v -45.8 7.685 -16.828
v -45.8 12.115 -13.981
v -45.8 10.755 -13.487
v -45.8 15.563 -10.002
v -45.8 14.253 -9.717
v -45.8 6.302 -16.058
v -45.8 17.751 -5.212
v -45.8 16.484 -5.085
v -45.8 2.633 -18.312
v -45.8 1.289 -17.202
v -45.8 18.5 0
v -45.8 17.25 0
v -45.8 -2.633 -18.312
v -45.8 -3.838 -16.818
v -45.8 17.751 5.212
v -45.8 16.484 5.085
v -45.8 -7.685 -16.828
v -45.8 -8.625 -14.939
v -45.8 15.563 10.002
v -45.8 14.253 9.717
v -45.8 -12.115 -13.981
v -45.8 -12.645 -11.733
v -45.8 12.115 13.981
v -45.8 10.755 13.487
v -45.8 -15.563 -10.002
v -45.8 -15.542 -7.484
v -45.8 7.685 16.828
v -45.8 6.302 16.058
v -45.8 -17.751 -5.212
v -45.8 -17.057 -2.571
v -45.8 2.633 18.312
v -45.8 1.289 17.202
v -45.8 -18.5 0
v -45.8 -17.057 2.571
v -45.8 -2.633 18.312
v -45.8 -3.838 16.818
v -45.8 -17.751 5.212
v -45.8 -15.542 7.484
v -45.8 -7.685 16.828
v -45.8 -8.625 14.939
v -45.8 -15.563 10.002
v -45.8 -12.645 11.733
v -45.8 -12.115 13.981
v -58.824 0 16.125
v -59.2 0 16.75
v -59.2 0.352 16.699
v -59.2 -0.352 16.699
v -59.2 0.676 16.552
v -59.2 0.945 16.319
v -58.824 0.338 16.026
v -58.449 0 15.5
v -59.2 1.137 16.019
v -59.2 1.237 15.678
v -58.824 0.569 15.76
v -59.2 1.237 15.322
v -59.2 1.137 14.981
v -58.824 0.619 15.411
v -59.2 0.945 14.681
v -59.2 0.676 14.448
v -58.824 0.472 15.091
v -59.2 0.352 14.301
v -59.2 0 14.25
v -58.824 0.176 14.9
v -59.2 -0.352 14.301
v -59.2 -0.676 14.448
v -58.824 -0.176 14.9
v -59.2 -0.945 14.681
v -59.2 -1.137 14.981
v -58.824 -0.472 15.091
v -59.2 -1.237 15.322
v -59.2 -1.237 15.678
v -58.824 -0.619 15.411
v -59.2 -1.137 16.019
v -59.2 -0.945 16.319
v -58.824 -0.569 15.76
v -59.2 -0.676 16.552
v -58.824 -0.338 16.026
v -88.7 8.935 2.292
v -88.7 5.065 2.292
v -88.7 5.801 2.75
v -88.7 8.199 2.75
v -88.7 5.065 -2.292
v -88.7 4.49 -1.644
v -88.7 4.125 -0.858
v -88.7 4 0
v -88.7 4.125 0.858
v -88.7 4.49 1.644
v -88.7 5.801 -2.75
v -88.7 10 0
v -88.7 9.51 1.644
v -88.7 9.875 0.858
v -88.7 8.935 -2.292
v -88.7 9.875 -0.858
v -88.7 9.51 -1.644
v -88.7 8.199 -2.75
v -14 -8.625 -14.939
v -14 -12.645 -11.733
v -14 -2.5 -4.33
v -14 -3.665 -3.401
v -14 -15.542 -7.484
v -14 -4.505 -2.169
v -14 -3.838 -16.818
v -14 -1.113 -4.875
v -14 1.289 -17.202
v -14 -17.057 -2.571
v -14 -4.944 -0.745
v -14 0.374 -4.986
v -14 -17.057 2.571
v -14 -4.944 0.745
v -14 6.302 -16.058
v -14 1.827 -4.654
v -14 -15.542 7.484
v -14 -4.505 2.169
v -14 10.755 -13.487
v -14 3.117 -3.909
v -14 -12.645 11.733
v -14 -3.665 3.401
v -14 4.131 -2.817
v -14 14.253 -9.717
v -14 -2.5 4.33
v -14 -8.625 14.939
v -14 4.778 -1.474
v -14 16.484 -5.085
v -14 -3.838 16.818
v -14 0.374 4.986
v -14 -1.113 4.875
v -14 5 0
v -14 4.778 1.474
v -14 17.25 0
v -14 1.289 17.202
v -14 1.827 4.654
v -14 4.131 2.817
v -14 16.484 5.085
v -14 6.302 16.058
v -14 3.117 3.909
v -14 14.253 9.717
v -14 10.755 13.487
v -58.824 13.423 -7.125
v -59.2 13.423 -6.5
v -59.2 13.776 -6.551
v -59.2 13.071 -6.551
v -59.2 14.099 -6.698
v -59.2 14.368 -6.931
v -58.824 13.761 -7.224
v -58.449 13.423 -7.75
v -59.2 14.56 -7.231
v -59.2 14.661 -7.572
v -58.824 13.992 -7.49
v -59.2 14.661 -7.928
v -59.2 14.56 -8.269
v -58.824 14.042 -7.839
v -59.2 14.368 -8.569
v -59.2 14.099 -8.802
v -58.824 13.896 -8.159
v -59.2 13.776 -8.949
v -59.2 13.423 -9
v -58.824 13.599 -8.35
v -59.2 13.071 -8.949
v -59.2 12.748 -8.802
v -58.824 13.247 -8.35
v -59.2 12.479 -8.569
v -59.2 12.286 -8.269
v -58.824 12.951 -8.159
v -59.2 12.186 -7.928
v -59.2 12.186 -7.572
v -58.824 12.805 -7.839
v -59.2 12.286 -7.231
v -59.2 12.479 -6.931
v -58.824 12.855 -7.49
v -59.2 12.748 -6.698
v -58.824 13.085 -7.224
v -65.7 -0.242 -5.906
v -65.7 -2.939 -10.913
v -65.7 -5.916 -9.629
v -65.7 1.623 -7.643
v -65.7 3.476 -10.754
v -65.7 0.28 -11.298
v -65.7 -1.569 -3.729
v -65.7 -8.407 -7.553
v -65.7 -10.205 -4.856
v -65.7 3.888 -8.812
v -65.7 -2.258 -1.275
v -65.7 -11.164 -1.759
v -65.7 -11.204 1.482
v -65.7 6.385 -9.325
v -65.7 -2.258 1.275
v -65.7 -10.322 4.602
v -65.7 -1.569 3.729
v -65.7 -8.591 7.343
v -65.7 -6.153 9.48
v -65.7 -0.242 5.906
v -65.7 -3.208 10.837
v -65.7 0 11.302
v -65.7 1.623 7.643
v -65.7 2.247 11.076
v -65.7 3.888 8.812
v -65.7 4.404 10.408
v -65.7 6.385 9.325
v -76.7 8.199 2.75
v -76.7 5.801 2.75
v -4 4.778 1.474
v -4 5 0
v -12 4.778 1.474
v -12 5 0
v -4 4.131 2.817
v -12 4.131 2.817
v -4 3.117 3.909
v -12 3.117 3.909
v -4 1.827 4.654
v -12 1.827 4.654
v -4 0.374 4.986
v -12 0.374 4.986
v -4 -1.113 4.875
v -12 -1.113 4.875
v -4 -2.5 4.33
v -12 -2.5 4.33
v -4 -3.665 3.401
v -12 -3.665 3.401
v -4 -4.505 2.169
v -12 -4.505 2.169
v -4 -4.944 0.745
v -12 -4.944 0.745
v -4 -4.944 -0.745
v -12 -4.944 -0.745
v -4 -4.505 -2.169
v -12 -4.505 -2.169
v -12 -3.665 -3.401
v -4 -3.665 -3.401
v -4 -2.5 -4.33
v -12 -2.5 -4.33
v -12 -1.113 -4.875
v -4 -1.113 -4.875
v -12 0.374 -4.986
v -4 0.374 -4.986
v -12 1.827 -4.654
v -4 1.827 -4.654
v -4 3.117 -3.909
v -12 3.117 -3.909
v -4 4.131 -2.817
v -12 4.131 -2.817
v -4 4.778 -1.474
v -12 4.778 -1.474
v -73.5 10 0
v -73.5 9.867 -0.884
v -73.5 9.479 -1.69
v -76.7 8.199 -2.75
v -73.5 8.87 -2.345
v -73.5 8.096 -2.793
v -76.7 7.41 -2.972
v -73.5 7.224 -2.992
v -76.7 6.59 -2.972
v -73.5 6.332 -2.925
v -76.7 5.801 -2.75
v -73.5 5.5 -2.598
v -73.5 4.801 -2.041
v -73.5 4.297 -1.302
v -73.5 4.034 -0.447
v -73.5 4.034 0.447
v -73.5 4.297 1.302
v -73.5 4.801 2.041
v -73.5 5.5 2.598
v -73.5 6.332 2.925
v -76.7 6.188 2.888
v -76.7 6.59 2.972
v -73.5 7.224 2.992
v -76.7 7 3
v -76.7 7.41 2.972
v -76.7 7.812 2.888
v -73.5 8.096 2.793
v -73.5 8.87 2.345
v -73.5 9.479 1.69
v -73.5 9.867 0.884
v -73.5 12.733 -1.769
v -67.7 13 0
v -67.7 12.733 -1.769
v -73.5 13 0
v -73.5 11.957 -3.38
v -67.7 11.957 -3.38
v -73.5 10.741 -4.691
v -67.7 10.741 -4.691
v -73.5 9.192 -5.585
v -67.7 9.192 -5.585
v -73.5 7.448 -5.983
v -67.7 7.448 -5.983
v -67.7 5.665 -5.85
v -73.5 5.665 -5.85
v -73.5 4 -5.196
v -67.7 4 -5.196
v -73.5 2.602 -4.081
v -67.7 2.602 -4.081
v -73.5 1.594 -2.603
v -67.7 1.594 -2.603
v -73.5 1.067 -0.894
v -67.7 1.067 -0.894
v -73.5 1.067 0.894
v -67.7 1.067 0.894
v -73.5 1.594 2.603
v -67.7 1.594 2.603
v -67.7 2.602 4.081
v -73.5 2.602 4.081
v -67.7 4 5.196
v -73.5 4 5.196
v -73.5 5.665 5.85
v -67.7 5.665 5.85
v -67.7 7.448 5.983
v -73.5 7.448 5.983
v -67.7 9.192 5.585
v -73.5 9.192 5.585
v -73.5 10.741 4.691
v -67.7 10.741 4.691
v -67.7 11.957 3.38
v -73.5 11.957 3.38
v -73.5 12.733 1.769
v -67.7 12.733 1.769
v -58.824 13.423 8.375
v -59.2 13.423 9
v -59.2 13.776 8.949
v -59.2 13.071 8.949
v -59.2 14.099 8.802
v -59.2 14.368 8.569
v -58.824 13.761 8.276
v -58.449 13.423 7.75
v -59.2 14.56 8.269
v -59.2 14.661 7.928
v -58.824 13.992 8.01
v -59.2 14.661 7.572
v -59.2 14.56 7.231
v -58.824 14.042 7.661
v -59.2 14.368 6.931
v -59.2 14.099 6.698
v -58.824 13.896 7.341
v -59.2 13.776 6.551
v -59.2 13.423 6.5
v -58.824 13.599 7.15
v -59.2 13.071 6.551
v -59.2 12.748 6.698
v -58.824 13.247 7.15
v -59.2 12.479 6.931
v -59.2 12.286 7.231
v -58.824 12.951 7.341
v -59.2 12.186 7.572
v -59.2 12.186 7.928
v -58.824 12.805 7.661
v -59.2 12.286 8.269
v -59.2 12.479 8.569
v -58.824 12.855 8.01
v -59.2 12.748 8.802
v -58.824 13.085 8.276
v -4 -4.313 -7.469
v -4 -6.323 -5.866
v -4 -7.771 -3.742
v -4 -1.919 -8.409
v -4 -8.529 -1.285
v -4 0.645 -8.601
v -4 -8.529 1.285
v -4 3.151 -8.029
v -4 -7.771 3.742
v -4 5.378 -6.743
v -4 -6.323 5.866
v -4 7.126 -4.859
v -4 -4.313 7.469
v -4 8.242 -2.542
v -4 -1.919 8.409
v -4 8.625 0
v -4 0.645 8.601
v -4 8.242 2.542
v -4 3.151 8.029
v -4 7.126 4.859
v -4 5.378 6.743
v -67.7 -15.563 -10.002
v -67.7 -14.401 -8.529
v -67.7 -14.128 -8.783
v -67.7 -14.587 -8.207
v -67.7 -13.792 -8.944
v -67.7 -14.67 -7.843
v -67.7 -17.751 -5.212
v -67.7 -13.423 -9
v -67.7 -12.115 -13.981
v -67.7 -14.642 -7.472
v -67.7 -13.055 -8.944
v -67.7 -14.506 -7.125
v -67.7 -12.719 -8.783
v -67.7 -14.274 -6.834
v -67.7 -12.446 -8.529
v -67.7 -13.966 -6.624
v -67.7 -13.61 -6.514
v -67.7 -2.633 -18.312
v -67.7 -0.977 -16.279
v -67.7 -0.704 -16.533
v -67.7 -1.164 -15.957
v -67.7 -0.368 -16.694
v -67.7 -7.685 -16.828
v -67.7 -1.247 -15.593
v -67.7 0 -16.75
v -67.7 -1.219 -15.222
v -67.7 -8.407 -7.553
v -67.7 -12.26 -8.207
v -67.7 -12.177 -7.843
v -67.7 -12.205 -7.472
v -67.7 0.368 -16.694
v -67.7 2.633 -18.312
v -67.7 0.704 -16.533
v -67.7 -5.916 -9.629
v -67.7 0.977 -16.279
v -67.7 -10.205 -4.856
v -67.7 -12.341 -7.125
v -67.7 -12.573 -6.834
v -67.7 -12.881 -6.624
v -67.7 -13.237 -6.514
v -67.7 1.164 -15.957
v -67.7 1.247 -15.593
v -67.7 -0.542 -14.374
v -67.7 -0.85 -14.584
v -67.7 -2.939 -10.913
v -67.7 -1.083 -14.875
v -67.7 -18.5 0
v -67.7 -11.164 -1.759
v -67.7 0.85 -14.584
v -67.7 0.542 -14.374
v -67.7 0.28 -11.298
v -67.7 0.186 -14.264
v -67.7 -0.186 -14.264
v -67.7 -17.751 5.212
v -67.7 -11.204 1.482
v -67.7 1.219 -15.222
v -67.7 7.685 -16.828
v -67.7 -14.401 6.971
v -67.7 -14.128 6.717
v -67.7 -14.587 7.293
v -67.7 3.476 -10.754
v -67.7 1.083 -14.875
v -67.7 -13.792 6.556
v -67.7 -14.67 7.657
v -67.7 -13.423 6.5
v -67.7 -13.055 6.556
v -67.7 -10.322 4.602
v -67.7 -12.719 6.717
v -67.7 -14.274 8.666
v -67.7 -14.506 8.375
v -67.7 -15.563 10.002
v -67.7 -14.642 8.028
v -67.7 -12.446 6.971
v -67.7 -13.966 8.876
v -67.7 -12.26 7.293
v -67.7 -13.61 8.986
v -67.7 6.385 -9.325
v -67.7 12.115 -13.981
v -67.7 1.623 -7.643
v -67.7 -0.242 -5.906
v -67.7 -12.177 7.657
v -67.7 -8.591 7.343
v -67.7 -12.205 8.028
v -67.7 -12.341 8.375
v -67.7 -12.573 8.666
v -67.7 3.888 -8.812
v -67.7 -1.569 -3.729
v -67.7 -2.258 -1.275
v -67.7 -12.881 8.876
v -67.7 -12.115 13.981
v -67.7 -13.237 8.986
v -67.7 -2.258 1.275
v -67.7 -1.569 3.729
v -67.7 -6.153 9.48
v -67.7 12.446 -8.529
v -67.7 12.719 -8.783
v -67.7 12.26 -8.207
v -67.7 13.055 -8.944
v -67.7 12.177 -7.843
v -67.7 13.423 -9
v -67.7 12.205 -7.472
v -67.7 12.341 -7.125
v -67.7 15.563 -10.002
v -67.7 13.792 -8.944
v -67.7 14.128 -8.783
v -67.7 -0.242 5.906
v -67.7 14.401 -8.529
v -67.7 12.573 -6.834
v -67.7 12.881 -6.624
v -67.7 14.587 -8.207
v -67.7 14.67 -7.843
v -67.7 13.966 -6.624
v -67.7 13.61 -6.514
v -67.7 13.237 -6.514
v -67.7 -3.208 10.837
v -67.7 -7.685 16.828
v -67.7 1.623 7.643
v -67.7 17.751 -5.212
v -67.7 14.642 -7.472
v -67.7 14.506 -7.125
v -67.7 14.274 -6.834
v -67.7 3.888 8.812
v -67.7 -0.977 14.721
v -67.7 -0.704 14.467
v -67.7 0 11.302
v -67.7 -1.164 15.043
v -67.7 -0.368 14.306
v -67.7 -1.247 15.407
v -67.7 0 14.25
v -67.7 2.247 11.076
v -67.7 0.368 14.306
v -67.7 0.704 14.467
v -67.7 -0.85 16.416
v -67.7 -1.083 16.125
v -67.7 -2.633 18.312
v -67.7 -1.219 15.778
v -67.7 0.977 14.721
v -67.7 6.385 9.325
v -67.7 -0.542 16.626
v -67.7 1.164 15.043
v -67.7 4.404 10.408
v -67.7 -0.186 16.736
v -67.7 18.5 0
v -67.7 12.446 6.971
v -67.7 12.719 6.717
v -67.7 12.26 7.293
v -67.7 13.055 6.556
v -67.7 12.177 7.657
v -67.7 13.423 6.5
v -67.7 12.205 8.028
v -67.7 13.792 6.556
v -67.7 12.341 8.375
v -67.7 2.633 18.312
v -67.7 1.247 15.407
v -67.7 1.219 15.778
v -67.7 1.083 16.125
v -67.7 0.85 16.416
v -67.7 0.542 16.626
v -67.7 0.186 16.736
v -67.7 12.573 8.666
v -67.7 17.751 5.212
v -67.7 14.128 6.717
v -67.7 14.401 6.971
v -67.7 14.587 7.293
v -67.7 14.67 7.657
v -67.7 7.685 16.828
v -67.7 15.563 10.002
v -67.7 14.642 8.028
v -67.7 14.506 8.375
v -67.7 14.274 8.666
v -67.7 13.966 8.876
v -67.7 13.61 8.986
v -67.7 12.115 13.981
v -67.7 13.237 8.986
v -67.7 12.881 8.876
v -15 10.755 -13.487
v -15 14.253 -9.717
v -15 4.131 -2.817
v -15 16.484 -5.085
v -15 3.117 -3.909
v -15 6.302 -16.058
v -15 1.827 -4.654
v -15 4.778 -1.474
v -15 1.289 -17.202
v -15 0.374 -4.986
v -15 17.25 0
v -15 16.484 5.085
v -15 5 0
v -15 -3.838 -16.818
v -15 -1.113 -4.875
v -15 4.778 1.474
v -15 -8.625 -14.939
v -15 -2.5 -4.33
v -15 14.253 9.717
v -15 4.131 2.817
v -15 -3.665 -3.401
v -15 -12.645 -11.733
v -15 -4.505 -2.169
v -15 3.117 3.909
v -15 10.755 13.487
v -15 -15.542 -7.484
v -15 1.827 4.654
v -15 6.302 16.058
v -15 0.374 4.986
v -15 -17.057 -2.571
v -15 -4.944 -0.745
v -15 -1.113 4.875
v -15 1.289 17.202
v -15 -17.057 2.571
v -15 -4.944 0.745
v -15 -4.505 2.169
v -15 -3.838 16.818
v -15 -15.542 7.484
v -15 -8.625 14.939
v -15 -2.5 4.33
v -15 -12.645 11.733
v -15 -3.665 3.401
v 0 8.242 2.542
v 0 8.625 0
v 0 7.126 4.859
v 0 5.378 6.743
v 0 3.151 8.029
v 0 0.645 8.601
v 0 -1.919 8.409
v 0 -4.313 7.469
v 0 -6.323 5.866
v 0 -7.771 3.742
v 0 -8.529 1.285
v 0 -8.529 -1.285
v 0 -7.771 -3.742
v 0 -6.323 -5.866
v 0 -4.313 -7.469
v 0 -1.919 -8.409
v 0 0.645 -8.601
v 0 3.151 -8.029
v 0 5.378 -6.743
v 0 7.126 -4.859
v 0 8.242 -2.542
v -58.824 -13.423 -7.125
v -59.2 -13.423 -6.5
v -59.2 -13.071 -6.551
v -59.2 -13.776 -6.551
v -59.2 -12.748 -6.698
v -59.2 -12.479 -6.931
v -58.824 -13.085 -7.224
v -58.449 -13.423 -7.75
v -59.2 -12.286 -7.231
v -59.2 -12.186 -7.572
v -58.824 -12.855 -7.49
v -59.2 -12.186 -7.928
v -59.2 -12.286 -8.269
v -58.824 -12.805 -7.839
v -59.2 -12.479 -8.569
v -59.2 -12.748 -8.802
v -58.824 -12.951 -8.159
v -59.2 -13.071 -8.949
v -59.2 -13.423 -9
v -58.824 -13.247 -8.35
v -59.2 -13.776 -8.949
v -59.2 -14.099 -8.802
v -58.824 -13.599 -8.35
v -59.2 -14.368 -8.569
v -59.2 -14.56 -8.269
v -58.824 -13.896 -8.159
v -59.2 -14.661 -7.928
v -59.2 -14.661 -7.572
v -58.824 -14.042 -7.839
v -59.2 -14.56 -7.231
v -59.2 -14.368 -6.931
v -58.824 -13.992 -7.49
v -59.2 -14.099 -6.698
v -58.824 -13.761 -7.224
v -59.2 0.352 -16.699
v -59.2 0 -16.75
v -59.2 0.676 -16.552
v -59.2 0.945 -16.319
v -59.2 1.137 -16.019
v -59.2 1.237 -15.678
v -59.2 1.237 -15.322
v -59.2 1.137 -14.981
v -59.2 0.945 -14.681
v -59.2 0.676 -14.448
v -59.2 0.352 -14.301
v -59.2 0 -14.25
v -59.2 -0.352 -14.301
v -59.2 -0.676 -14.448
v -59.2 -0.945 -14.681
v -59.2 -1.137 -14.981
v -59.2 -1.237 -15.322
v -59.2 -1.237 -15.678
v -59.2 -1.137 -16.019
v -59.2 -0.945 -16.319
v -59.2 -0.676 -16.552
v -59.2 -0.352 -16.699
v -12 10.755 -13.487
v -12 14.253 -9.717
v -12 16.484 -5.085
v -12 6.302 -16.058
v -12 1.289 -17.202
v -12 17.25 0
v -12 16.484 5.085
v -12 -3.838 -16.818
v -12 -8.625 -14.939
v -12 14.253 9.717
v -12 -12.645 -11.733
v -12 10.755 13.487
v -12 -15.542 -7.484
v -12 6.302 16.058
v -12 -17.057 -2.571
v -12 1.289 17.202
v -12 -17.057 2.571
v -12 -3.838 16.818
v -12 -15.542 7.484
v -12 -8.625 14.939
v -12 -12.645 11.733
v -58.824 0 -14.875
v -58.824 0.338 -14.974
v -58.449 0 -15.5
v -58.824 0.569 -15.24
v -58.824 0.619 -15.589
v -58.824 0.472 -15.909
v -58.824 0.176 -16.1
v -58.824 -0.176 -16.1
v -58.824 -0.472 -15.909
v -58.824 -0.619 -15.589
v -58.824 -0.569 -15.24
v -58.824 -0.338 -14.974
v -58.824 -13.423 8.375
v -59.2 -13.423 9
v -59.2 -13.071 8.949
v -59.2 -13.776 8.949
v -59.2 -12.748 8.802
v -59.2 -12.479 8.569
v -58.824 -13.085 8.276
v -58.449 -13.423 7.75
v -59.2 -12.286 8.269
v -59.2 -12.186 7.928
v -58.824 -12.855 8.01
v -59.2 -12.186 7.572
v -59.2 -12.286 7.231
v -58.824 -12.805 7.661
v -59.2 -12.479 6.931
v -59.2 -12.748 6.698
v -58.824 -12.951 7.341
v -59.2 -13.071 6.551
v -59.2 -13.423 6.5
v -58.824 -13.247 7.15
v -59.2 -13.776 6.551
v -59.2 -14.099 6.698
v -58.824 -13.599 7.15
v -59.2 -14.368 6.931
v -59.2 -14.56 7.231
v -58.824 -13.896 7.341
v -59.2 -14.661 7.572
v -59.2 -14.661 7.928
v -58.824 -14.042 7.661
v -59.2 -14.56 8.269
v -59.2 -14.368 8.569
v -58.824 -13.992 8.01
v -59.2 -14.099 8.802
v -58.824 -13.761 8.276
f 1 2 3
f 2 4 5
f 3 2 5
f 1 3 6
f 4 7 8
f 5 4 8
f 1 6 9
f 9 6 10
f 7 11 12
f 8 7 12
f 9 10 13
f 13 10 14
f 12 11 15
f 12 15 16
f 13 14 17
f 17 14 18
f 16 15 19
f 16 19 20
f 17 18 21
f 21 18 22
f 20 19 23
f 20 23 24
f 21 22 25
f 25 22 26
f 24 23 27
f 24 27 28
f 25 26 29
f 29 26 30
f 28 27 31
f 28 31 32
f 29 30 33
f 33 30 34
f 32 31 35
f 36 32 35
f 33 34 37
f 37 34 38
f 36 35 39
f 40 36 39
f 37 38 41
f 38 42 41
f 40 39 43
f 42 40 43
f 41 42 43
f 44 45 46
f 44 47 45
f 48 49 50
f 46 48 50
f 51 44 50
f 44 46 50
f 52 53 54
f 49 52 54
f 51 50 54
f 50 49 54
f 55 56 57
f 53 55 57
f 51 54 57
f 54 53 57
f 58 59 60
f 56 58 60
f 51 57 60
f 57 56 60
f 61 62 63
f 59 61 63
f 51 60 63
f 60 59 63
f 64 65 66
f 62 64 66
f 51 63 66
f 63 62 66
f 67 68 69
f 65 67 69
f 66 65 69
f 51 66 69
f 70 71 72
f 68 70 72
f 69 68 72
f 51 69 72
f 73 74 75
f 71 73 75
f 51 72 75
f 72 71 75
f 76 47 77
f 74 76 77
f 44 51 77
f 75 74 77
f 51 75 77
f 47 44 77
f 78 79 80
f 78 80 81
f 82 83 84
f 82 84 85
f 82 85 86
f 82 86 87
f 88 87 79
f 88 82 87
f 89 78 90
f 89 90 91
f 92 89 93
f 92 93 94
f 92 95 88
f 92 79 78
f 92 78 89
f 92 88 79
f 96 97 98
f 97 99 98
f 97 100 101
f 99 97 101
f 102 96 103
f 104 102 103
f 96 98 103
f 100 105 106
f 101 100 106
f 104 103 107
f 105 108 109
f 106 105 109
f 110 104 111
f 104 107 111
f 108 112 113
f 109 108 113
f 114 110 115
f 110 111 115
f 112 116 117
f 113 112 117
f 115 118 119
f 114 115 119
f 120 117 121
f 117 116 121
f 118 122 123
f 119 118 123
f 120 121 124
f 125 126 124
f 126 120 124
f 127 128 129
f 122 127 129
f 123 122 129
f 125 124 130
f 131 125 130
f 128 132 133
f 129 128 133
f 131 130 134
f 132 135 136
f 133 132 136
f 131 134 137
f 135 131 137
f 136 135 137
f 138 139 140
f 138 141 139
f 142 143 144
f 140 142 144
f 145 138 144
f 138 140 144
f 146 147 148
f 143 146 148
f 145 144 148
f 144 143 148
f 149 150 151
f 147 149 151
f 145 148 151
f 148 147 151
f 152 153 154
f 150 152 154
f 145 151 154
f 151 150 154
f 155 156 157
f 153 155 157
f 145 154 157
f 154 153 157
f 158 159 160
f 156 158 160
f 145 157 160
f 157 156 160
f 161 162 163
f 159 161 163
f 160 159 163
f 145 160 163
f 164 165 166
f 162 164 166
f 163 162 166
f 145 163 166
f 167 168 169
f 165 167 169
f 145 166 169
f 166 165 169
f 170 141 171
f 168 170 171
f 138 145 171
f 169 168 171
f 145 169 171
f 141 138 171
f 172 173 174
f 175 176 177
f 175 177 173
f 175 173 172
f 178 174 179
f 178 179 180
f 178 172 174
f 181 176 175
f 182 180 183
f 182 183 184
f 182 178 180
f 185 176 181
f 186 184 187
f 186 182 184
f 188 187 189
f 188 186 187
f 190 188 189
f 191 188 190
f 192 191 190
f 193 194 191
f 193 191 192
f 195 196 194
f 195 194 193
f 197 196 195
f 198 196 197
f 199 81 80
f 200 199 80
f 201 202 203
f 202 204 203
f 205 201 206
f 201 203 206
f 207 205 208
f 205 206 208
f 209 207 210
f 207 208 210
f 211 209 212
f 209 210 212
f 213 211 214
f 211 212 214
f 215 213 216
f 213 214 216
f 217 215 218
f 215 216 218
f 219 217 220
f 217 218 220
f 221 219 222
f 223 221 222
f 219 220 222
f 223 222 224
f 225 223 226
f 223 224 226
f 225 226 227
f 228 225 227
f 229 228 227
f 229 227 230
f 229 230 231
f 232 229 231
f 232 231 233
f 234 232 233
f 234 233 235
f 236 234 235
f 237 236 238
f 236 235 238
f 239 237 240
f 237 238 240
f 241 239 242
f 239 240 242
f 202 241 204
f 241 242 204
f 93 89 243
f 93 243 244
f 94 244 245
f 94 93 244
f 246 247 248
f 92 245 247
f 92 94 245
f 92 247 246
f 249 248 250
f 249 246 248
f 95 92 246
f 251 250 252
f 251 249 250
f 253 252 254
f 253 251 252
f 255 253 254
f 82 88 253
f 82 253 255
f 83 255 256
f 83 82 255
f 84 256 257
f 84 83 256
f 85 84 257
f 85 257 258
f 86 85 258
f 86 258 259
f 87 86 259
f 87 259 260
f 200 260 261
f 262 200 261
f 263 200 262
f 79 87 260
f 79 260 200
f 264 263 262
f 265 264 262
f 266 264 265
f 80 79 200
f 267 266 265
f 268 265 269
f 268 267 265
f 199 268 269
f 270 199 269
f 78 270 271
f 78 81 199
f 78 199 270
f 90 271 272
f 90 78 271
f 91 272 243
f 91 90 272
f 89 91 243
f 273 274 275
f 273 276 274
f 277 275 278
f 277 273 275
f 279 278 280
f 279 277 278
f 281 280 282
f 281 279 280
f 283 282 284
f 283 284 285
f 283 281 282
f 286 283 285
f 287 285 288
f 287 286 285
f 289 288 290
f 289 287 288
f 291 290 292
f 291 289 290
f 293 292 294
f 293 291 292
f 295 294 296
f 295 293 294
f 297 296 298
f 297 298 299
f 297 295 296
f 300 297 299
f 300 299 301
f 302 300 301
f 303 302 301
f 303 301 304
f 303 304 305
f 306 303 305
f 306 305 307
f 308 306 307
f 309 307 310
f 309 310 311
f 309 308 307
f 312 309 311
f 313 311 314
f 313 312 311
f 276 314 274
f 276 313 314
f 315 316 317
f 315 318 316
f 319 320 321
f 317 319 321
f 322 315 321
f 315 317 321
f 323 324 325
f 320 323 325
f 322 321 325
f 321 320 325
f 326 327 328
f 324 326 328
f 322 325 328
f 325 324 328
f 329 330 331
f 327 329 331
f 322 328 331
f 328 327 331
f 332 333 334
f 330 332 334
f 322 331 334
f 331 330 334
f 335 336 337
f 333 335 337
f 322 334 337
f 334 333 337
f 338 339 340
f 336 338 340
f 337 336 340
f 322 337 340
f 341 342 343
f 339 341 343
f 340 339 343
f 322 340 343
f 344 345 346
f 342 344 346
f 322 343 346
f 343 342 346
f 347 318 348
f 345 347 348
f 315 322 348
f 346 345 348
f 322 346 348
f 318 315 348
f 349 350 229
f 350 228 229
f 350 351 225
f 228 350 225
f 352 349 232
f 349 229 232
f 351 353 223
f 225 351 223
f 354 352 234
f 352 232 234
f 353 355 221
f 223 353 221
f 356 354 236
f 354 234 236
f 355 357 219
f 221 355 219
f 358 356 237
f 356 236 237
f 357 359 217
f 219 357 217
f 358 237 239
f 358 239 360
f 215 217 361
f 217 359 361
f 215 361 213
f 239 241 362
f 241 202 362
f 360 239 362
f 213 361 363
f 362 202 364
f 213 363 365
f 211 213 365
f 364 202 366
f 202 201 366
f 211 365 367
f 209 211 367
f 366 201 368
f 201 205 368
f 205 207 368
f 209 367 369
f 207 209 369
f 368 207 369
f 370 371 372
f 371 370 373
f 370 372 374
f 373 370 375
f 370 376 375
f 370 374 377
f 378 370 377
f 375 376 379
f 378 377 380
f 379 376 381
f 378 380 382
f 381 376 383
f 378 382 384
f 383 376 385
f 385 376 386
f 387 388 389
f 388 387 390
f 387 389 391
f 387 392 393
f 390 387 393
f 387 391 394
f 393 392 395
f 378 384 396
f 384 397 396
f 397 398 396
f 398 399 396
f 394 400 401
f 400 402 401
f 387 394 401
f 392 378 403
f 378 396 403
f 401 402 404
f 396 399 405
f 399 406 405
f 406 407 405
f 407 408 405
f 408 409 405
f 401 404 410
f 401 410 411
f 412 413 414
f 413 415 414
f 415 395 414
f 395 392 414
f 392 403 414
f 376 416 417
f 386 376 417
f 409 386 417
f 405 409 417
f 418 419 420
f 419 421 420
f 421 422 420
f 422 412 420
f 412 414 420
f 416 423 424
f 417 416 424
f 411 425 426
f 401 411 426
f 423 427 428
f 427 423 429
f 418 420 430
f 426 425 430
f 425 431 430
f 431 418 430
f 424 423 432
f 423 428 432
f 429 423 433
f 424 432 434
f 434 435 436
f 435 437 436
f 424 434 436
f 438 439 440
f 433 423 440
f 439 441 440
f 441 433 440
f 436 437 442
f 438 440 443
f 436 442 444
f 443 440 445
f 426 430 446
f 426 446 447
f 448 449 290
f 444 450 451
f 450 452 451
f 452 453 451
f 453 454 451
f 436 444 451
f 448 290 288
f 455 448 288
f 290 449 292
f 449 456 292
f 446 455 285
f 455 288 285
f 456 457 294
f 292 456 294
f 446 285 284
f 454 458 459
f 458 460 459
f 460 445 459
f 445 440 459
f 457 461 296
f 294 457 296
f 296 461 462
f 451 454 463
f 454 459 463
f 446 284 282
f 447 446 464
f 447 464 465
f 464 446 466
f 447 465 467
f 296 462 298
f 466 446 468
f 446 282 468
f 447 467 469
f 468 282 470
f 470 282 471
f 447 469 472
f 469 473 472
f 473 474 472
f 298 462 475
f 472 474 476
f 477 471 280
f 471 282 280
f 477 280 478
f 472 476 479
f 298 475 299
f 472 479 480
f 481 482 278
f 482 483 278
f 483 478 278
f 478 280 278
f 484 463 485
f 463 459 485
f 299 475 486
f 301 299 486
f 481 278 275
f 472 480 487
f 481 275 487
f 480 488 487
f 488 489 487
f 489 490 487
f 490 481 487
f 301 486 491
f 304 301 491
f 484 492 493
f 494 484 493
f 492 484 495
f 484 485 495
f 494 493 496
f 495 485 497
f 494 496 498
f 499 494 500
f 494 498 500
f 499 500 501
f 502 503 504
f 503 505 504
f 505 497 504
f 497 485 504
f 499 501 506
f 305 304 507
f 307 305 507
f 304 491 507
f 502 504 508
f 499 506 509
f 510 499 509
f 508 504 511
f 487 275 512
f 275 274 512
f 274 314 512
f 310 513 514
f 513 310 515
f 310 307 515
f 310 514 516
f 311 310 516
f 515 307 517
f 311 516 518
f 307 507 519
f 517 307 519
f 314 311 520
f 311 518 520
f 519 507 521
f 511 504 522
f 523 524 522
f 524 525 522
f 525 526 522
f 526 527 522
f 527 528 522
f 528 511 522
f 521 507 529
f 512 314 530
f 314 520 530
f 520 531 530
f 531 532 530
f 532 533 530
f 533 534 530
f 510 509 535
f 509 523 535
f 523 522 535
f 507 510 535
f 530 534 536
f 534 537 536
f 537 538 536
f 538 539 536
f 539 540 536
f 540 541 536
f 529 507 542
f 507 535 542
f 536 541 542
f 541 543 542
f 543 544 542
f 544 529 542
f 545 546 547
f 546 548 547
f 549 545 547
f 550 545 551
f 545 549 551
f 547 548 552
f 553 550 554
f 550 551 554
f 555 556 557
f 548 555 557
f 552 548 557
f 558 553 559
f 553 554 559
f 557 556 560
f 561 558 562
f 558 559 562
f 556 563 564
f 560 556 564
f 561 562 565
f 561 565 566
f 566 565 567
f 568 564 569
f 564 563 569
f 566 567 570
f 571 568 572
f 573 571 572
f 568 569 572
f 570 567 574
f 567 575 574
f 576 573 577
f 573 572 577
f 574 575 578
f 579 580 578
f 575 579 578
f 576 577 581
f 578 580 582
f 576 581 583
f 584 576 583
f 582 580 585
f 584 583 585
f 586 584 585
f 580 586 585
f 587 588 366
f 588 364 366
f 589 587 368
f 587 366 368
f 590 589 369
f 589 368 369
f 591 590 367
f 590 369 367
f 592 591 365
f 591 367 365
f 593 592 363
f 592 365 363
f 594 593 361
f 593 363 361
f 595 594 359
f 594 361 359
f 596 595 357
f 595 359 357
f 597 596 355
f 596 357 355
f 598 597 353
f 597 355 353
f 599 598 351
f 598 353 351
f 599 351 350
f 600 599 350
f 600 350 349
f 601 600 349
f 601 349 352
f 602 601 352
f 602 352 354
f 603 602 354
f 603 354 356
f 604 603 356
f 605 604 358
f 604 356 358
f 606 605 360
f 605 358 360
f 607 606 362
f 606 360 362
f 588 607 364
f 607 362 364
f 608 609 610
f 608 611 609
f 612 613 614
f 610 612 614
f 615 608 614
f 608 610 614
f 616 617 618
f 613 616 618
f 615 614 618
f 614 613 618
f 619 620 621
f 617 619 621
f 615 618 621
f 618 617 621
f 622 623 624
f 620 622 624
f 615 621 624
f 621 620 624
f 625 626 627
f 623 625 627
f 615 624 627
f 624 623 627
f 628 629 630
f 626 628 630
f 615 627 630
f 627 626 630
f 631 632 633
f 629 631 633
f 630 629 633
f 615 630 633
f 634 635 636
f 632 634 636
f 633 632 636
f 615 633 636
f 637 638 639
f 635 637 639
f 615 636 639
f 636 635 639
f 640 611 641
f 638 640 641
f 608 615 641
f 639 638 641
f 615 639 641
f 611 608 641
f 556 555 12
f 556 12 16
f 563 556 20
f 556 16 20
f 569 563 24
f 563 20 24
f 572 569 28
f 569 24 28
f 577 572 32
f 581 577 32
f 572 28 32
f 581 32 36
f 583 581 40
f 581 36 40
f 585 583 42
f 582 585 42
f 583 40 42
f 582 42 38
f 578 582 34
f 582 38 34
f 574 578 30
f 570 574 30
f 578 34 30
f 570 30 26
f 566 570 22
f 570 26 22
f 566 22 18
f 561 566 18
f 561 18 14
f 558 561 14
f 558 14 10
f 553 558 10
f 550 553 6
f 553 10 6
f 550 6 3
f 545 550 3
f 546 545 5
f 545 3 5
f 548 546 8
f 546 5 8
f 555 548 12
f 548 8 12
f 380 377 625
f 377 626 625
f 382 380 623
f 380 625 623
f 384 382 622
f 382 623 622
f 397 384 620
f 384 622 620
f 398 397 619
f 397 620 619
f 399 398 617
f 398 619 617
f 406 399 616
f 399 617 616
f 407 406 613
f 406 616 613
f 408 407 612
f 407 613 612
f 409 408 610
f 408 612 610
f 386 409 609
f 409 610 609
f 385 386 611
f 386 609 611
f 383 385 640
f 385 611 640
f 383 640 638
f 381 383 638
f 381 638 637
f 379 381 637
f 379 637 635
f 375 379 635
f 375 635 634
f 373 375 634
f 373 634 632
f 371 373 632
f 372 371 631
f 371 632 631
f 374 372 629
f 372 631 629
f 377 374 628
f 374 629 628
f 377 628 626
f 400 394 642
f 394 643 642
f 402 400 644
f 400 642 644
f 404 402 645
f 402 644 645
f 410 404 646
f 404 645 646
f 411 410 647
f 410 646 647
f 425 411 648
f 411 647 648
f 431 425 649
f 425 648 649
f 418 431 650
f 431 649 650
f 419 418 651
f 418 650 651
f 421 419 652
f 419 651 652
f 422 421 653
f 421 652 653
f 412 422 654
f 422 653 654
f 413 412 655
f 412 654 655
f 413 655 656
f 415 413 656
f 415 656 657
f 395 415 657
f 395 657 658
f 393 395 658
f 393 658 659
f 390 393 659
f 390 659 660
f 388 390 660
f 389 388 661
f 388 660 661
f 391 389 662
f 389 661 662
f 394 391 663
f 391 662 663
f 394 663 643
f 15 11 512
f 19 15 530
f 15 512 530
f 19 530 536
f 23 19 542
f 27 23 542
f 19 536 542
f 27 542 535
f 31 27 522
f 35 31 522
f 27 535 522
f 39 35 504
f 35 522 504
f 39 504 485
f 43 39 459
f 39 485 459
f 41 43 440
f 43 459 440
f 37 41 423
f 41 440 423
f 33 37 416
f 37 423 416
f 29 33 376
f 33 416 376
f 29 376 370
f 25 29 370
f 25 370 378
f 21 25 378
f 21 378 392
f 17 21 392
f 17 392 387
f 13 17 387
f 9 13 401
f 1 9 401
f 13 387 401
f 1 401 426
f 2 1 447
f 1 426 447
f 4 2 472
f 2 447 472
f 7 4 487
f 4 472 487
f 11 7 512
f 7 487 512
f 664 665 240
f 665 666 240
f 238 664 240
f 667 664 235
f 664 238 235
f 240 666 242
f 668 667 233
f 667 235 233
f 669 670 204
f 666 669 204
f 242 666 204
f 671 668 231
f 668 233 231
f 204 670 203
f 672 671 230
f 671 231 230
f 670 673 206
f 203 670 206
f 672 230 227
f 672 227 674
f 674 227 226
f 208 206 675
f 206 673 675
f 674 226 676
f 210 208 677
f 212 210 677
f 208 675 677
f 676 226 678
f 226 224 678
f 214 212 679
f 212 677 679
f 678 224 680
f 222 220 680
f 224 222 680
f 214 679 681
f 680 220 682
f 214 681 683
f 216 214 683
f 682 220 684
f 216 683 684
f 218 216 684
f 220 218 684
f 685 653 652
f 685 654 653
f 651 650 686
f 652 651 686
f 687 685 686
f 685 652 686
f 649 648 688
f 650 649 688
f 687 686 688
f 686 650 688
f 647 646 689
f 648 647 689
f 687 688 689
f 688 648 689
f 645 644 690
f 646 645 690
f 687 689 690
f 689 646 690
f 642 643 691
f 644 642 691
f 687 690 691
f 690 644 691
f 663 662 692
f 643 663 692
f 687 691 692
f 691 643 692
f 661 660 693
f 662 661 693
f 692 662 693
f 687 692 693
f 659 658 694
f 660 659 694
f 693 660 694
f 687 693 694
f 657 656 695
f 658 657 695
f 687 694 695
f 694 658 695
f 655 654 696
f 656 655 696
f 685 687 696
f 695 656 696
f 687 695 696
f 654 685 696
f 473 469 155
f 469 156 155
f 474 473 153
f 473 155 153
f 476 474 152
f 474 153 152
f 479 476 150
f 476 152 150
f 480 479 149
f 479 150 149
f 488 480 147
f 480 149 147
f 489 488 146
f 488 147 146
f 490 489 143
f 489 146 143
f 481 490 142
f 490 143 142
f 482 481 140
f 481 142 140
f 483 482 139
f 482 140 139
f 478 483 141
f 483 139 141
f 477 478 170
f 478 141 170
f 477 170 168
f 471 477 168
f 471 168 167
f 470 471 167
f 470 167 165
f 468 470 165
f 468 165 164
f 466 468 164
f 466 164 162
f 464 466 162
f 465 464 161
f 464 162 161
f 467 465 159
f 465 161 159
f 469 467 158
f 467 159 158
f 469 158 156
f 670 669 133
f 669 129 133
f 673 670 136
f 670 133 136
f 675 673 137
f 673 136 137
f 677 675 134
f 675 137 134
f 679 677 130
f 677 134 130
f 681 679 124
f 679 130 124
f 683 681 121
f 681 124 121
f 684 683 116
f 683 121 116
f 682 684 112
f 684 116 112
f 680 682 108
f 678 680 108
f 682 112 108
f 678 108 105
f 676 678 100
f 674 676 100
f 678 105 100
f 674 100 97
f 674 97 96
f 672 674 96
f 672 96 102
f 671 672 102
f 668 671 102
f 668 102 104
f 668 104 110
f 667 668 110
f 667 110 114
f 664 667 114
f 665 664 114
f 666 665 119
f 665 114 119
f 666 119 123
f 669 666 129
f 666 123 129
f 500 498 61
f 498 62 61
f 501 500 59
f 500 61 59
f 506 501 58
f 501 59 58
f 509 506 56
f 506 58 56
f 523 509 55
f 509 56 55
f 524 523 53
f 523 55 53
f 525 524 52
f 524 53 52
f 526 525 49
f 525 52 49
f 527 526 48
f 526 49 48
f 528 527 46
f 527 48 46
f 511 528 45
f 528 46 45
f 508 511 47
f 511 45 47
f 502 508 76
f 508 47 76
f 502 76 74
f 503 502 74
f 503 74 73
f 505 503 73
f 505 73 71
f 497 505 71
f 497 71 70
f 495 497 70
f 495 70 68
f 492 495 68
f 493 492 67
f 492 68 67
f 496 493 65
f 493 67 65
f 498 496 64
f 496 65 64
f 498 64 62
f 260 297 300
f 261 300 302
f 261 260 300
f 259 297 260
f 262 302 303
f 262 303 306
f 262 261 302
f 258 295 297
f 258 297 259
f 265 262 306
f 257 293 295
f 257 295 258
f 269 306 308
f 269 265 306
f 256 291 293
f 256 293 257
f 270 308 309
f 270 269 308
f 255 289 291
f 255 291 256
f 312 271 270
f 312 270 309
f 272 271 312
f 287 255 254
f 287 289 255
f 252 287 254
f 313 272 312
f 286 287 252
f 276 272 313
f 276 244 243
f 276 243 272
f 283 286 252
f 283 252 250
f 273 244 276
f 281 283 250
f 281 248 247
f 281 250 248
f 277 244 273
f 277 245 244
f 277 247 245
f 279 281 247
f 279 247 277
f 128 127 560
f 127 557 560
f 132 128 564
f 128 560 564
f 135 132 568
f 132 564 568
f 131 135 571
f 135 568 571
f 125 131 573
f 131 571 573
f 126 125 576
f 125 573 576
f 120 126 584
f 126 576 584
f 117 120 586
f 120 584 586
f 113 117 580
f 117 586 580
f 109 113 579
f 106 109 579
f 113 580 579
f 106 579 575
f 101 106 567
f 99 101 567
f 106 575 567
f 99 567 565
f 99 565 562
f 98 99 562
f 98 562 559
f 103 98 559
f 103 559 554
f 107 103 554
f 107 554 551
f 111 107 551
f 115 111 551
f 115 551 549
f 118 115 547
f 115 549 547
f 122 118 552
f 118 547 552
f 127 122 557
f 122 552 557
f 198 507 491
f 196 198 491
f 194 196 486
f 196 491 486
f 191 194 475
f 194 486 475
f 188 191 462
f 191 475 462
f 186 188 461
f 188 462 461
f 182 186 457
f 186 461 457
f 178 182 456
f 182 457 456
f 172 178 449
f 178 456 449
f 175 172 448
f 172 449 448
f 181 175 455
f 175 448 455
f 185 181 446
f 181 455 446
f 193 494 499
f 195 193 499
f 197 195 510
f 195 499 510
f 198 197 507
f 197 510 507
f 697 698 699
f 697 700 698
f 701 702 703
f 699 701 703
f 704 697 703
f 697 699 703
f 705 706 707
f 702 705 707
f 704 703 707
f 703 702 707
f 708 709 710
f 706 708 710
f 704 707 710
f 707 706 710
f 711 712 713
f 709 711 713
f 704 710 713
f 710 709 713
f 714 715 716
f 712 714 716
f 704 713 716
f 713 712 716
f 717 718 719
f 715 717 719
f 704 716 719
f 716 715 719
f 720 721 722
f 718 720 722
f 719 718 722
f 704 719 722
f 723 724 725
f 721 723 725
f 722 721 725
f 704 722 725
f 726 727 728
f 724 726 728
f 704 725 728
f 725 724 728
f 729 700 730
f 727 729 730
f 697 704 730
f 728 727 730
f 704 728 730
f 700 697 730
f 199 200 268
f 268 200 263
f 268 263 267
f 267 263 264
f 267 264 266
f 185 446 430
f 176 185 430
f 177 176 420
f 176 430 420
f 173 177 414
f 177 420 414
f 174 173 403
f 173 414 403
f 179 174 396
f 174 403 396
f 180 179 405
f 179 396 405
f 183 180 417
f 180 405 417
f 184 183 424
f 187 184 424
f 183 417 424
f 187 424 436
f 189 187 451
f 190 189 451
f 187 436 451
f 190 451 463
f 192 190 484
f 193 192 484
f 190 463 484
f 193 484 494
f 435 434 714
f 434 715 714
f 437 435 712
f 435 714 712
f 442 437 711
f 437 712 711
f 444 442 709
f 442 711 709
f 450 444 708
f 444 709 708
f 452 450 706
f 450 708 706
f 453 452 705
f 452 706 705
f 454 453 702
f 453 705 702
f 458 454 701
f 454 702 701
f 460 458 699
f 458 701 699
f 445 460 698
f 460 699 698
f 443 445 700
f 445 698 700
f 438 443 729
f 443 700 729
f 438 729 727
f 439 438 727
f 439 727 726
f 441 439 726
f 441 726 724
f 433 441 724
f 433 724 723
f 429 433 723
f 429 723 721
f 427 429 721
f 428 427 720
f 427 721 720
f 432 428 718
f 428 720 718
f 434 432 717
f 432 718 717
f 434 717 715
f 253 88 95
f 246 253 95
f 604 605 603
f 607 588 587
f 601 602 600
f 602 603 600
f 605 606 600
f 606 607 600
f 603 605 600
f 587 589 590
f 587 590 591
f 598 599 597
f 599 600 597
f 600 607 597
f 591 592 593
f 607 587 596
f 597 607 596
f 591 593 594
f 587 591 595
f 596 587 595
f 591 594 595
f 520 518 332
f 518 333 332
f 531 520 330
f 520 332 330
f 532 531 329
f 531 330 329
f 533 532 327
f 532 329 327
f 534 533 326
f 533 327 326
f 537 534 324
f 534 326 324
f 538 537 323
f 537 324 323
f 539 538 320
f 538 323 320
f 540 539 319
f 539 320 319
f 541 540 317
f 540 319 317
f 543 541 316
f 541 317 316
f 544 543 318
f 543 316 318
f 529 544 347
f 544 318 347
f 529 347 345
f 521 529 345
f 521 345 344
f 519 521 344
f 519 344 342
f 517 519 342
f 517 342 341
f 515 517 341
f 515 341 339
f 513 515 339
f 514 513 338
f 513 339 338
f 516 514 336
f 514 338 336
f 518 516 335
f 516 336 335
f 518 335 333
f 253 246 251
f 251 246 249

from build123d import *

# Parameters (mm, degrees)
CUT_EXTRUDE1_DEPTH        = 12
M3X0_5_TAPPED_HOLE1_D     = 2.5
M3X0_5_TAPPED_HOLE1_DEPTH = 8.5
M3X0_5_TAPPED_HOLE1_TIP   = 0.751075774
CUT_EXTRUDE2_DEPTH        = 2


with BuildPart() as part:
    # Sketch1 → MainBody (revolve)
    with BuildSketch(Plane.XY):
        Polygon((0, 0), (0, 8.625), (-4, 8.625), (-4, 5), (-12, 5), (-12, 17.25), (-14, 17.25), (-14, 5), (-15, 5), (-15, 17.25), (-45.8, 17.25), (-45.8, 18.5), (-67.7, 18.5), (-67.7, 0), align=None)
    revolve(axis=Axis((-80.111398028, 0, 0), (1, 0, 0)))

    # Sketch3 → SmallBoss (revolve)
    with BuildSketch(Plane.XY):
        Polygon((-67.7, 7), (-67.7, 13), (-73.5, 13), (-73.5, 10), (-88.7, 10), (-88.7, 7), align=None)
    revolve(axis=Axis((0, 7, 0), (-1, 0, 0)))

    # Sketch4 → Cut-Extrude1 (cut)
    with BuildSketch(Plane.ZY.offset(88.7)):
        with BuildLine():
            Line((-2.75, 5.801042119), (-2.75, 8.198957881))
            ThreePointArc((-2.75, 8.198957881), (-3, 7), (-2.75, 5.801042119))
        make_face()
        with BuildLine():
            ThreePointArc((3, 7), (2.936835031, 7.612372436), (2.75, 8.198957881))
            Line((2.75, 8.198957881), (2.75, 5.801042119))
            ThreePointArc((2.75, 5.801042119), (2.936835031, 6.387627564), (3, 7))
        make_face()
    extrude(amount=-CUT_EXTRUDE1_DEPTH, mode=Mode.SUBTRACT)

    # M3x0.5 Tapped Hole1
    with Locations(Plane.ZY.offset(67.7)):
        with Locations((7.75, 13.423393759), (15.5, 0), (7.75, -13.423393759), (-7.75, -13.423393759), (-15.5, 0), (-7.75, 13.423393759)):
            Hole(M3X0_5_TAPPED_HOLE1_D / 2, depth=M3X0_5_TAPPED_HOLE1_DEPTH)
            with Locations((0, 0, -(M3X0_5_TAPPED_HOLE1_DEPTH + M3X0_5_TAPPED_HOLE1_TIP / 2))):  # 118° drill point
                Cone(0, M3X0_5_TAPPED_HOLE1_D / 2, M3X0_5_TAPPED_HOLE1_TIP, mode=Mode.SUBTRACT)

    # Sketch9 → Cut-Extrude2 (cut)
    with BuildSketch(Plane.ZY.offset(67.7)):
        with BuildLine():
            ThreePointArc((-9.324839925, 6.385470704), (-3.342227597, -10.796128493), (11.301631552, 0))
            ThreePointArc((11.301631552, 0), (10.796128493, 3.342227597), (9.324839925, 6.385470704))
            ThreePointArc((9.324839925, 6.385470704), (0, -2.345067463), (-9.324839925, 6.385470704))
        make_face()
    extrude(amount=-CUT_EXTRUDE2_DEPTH, mode=Mode.SUBTRACT)


solid = part.part
